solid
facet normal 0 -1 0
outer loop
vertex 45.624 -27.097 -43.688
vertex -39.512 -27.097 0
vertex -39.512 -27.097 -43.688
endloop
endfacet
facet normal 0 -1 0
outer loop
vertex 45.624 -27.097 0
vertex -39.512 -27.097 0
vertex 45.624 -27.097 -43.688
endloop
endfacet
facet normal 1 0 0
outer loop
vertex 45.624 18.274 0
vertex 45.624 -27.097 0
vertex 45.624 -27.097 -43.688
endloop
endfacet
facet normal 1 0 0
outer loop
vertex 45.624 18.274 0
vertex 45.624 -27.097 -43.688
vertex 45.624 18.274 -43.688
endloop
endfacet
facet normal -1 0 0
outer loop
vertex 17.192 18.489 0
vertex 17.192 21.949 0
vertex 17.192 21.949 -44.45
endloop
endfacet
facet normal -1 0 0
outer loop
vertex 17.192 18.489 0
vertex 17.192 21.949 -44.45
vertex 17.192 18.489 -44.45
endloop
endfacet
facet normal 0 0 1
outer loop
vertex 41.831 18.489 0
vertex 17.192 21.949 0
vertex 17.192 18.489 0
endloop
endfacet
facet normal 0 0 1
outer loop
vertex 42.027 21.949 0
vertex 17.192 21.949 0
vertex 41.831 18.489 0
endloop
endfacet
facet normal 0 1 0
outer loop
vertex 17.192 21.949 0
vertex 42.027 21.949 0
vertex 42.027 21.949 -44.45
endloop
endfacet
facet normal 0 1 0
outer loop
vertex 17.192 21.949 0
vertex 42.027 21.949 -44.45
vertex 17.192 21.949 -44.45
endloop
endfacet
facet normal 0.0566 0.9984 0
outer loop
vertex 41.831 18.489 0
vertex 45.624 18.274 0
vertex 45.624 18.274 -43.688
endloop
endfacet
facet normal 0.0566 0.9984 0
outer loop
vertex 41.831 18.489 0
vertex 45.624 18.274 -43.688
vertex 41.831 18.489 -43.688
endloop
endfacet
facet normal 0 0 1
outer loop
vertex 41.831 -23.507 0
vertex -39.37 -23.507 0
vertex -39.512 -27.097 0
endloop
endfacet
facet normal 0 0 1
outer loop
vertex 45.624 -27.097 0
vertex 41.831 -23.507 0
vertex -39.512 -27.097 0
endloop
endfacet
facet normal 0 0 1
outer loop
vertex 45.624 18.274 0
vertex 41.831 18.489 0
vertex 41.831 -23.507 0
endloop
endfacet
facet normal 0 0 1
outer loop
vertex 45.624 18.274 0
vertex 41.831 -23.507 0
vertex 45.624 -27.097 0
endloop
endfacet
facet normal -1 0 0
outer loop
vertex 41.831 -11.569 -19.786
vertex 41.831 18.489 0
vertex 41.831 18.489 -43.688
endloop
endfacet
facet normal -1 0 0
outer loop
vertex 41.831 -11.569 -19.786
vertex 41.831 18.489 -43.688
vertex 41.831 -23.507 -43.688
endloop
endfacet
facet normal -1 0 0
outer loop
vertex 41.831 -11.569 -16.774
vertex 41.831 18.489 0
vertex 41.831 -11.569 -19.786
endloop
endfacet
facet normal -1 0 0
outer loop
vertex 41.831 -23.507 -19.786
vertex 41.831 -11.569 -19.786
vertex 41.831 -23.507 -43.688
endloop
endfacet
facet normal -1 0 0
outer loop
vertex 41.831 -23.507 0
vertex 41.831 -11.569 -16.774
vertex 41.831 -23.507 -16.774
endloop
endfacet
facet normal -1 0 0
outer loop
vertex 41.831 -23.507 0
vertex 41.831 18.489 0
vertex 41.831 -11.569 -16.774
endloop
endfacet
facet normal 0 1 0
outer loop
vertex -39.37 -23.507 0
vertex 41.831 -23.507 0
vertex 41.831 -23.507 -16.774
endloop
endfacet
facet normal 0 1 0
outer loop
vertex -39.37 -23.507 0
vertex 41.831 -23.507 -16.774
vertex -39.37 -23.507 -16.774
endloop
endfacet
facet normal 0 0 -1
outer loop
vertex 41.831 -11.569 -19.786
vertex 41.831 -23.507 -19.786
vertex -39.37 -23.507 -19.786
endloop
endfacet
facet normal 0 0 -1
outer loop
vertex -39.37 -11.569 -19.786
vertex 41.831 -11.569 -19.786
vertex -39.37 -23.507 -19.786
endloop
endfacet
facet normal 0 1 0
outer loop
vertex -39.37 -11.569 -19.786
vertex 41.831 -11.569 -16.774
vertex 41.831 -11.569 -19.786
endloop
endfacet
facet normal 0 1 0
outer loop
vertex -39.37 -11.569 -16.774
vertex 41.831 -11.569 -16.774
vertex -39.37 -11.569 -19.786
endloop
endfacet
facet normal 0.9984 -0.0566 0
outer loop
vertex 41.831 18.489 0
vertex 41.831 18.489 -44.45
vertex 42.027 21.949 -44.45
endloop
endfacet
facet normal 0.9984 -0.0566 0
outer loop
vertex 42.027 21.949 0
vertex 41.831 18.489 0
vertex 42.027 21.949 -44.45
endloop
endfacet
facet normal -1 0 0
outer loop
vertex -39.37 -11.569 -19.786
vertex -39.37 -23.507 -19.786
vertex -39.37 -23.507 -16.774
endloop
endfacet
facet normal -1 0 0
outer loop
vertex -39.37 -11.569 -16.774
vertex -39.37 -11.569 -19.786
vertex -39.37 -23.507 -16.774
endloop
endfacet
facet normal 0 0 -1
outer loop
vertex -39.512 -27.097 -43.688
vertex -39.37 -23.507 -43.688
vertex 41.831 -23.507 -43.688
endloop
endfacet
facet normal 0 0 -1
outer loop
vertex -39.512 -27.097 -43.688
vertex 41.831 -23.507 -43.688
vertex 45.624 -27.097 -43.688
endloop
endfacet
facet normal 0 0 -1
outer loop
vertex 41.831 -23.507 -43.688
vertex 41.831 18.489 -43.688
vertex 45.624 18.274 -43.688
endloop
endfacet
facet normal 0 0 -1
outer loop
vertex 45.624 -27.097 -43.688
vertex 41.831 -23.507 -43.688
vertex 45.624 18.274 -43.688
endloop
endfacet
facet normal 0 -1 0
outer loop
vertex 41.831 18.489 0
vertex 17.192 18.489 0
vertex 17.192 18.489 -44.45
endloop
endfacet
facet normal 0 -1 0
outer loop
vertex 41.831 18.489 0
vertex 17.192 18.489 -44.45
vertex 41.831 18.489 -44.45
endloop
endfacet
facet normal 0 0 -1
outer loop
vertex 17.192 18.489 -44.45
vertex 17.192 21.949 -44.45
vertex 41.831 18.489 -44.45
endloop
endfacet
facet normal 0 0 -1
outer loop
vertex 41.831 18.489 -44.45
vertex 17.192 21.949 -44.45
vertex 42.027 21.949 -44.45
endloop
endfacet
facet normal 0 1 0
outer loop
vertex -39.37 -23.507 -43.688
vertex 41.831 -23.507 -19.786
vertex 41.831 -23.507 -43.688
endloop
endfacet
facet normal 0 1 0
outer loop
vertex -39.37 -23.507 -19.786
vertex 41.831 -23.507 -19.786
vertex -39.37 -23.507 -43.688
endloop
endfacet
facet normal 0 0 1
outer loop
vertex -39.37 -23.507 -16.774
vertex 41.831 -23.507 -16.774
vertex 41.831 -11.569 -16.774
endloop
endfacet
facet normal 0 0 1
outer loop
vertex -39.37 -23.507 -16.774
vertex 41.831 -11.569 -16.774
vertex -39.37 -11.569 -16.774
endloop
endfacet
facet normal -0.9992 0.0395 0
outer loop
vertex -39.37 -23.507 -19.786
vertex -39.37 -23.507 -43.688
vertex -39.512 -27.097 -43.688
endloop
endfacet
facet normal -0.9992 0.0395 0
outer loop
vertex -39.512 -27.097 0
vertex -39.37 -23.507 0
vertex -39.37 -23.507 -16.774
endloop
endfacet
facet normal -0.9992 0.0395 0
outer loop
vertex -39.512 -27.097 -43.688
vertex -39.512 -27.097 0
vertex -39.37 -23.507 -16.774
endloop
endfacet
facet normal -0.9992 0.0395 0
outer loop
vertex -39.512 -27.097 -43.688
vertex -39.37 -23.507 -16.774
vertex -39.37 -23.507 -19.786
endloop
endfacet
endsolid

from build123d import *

# Parameters (mm, degrees)
F1_DEPTH = 44.45
F2_DEPTH = 43.688
F3_W     = 81.200633198
F3_H     = 3.012213856
F4_DEPTH = 11.938


# Not quite as in the source:
# - ends of sketch curves that miss each other by under 0.0002 mm in the source are joined


with BuildPart() as f1:
    # F0 (on Top) → F1 (new body)
    with BuildSketch(Plane.XY):
        Polygon((17.2227267176, 18.4892974794), (41.8306589127, 18.4892974794), (42.026810348, 21.9491124153), (17.1921476722, 21.9491124153), (17.1921476722, 18.4892974794), align=None)
    extrude(amount=-F1_DEPTH)


with BuildPart() as f2:
    # F0 (on Top) → F2 (new body)
    with BuildSketch(Plane.XY):
        Polygon((41.8306589127, -23.5073789954), (12.9724387079, -23.5073789954), (12.9724387079, -27.0969830453), (45.6240410119, -27.0969830453), (45.6240410119, 18.274234721), (41.8306589127, 18.4892974794), (41.8306589127, 10.6105906889), align=None)
        Polygon((-9.2982515926, -23.5073789954), (-39.3699742854, -23.5073789954), (-39.5123288035, -27.0969830453), (12.9724387079, -27.0969830453), (12.9724387079, -23.5073789954), align=None)
    extrude(amount=-F2_DEPTH)

    # F3 (on face) → F4 (join)
    with BuildSketch(Plane(origin=(0, -23.5073789954, 0), x_dir=(-1, 0, 0), z_dir=(0, 1, 0))):
        with Locations((-1.2303423136, -18.2796660811)):
            Rectangle(F3_W, F3_H)
    extrude(amount=F4_DEPTH)


solid = Compound([f1.part, f2.part])
